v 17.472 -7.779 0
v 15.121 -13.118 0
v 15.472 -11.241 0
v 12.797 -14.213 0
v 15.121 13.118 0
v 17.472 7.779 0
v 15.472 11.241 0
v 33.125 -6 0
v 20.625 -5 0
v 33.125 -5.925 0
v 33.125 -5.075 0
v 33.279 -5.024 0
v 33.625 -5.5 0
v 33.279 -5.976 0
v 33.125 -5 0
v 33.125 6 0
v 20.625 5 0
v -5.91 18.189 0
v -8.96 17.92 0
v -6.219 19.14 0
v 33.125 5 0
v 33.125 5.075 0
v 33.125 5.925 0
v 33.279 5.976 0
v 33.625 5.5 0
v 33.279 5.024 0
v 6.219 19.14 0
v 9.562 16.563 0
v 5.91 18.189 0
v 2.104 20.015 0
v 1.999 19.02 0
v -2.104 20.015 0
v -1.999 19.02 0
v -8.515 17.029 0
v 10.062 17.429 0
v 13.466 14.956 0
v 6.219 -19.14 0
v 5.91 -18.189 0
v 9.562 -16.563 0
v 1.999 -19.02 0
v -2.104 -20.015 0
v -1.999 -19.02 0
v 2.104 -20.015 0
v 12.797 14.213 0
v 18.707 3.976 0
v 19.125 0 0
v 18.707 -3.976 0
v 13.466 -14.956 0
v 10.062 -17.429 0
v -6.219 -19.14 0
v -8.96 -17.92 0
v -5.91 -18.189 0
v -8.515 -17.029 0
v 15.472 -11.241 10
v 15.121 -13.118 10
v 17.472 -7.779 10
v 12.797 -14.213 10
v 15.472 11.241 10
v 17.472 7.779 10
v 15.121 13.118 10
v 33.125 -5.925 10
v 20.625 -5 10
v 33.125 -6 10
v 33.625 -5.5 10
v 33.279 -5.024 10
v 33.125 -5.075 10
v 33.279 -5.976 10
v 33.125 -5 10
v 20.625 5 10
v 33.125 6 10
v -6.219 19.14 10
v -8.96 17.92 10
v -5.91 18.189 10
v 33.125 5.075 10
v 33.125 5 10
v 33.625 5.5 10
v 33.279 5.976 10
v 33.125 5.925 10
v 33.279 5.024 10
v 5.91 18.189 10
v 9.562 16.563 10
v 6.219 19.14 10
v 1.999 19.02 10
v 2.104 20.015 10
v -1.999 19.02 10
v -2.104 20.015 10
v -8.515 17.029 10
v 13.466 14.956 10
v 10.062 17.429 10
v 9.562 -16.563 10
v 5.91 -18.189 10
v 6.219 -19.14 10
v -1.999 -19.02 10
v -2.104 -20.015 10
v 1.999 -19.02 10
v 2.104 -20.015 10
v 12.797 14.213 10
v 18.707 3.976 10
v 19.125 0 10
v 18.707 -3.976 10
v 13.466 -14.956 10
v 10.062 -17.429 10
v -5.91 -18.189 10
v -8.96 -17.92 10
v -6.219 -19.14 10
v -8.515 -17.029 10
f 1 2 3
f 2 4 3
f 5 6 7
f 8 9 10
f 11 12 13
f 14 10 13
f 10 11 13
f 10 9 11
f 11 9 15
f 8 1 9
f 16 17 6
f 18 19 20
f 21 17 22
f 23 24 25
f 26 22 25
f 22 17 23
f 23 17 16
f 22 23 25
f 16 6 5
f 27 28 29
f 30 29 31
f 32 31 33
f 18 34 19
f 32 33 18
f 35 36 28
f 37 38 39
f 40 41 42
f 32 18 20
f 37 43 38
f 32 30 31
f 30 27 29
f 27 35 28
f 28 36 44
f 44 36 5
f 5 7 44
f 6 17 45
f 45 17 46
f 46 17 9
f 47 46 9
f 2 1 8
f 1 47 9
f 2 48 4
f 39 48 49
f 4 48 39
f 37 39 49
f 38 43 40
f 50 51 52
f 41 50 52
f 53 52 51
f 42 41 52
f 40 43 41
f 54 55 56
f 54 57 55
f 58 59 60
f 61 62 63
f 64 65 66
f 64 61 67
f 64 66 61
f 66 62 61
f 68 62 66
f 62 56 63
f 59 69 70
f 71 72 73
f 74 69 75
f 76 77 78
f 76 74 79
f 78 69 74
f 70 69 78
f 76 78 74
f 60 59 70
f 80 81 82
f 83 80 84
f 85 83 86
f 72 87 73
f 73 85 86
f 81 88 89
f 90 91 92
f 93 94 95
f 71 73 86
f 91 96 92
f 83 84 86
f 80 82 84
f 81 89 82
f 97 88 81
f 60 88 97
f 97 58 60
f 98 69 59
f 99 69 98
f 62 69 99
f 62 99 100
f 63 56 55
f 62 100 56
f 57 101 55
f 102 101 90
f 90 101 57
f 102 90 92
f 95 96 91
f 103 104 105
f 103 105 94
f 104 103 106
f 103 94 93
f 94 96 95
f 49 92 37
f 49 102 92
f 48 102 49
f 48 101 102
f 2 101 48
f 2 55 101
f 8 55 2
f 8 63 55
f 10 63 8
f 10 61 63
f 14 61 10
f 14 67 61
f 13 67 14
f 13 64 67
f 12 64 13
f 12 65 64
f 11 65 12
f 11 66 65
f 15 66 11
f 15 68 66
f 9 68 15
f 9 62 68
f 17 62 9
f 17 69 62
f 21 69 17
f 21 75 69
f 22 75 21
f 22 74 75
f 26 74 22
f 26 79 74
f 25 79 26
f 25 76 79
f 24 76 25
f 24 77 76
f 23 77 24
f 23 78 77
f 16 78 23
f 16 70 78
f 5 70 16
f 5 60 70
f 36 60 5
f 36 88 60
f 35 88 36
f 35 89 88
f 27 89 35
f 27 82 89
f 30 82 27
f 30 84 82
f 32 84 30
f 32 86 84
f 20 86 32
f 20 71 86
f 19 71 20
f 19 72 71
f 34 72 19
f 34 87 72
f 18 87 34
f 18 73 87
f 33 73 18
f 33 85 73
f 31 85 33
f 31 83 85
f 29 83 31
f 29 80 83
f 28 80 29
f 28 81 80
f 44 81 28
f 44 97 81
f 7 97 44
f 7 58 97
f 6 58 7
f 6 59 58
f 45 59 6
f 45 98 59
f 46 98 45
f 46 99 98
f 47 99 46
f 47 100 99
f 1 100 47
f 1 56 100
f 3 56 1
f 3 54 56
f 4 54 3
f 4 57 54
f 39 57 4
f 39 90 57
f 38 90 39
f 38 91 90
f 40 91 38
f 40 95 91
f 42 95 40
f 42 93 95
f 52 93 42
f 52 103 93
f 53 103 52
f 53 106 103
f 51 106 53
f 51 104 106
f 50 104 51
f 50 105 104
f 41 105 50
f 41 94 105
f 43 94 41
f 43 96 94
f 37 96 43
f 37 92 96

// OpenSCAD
// A 3D printable for a basic holder to keep the LED strip straight,
// keeping it (mostly) from lying sideways, since that's what it tends
// to do coming out of a sideways twist to go around a bend.
//
// Really just a partial circle the size of the corresponding frame tube,
// with a little triangular gripper on front.
// Not designed to grip with any sort of friction, you'll probably want
// zip ties or such to hold things in place,
// and a few of these holders to keep them from folding.
//
// Frame tube diameter, for my particular bike:
// upper - 32.25mm
// rear - 32.25mm
// bottom - 35.5mm
// front - 38.25mm

diam = 38.25;
offset = diam / 2 + 1.5;

// Polygon shape for our "gripper" part:
// a U shaped slot of 10mm wide and 12.5mm deep holds the strip,
// with walls that start 1mm wide and slope outwards at a roughly 2:1 ratio,
// eventually meeting up with the main structure circle.
p = [
  [   0,   5],
  [12.5,   5],
  [12.5,   6],
  [-9.0, 14.5],
  [-9.0,-14.5],
  [12.5,  -6],
  [12.5,  -5],
  [   0,  -5],
  [   0,   5],
];

module clamp() {
    translate([offset, 0])
        polygon(p);
    translate([offset + 12.5, 5.5])
        circle(d=1);
    translate([offset + 12.5, -5.5])
        circle(d=1);
}

module 2dstuff() {
difference() {
    union() {
        circle(d=diam + 2);
        clamp();
    }
    union() {
        circle(d=diam);
        polygon([[0, 0], [-30, 60], [-30, -60], [0, 0]]);
    }
}
}

linear_extrude(10) {
    2dstuff();
}
